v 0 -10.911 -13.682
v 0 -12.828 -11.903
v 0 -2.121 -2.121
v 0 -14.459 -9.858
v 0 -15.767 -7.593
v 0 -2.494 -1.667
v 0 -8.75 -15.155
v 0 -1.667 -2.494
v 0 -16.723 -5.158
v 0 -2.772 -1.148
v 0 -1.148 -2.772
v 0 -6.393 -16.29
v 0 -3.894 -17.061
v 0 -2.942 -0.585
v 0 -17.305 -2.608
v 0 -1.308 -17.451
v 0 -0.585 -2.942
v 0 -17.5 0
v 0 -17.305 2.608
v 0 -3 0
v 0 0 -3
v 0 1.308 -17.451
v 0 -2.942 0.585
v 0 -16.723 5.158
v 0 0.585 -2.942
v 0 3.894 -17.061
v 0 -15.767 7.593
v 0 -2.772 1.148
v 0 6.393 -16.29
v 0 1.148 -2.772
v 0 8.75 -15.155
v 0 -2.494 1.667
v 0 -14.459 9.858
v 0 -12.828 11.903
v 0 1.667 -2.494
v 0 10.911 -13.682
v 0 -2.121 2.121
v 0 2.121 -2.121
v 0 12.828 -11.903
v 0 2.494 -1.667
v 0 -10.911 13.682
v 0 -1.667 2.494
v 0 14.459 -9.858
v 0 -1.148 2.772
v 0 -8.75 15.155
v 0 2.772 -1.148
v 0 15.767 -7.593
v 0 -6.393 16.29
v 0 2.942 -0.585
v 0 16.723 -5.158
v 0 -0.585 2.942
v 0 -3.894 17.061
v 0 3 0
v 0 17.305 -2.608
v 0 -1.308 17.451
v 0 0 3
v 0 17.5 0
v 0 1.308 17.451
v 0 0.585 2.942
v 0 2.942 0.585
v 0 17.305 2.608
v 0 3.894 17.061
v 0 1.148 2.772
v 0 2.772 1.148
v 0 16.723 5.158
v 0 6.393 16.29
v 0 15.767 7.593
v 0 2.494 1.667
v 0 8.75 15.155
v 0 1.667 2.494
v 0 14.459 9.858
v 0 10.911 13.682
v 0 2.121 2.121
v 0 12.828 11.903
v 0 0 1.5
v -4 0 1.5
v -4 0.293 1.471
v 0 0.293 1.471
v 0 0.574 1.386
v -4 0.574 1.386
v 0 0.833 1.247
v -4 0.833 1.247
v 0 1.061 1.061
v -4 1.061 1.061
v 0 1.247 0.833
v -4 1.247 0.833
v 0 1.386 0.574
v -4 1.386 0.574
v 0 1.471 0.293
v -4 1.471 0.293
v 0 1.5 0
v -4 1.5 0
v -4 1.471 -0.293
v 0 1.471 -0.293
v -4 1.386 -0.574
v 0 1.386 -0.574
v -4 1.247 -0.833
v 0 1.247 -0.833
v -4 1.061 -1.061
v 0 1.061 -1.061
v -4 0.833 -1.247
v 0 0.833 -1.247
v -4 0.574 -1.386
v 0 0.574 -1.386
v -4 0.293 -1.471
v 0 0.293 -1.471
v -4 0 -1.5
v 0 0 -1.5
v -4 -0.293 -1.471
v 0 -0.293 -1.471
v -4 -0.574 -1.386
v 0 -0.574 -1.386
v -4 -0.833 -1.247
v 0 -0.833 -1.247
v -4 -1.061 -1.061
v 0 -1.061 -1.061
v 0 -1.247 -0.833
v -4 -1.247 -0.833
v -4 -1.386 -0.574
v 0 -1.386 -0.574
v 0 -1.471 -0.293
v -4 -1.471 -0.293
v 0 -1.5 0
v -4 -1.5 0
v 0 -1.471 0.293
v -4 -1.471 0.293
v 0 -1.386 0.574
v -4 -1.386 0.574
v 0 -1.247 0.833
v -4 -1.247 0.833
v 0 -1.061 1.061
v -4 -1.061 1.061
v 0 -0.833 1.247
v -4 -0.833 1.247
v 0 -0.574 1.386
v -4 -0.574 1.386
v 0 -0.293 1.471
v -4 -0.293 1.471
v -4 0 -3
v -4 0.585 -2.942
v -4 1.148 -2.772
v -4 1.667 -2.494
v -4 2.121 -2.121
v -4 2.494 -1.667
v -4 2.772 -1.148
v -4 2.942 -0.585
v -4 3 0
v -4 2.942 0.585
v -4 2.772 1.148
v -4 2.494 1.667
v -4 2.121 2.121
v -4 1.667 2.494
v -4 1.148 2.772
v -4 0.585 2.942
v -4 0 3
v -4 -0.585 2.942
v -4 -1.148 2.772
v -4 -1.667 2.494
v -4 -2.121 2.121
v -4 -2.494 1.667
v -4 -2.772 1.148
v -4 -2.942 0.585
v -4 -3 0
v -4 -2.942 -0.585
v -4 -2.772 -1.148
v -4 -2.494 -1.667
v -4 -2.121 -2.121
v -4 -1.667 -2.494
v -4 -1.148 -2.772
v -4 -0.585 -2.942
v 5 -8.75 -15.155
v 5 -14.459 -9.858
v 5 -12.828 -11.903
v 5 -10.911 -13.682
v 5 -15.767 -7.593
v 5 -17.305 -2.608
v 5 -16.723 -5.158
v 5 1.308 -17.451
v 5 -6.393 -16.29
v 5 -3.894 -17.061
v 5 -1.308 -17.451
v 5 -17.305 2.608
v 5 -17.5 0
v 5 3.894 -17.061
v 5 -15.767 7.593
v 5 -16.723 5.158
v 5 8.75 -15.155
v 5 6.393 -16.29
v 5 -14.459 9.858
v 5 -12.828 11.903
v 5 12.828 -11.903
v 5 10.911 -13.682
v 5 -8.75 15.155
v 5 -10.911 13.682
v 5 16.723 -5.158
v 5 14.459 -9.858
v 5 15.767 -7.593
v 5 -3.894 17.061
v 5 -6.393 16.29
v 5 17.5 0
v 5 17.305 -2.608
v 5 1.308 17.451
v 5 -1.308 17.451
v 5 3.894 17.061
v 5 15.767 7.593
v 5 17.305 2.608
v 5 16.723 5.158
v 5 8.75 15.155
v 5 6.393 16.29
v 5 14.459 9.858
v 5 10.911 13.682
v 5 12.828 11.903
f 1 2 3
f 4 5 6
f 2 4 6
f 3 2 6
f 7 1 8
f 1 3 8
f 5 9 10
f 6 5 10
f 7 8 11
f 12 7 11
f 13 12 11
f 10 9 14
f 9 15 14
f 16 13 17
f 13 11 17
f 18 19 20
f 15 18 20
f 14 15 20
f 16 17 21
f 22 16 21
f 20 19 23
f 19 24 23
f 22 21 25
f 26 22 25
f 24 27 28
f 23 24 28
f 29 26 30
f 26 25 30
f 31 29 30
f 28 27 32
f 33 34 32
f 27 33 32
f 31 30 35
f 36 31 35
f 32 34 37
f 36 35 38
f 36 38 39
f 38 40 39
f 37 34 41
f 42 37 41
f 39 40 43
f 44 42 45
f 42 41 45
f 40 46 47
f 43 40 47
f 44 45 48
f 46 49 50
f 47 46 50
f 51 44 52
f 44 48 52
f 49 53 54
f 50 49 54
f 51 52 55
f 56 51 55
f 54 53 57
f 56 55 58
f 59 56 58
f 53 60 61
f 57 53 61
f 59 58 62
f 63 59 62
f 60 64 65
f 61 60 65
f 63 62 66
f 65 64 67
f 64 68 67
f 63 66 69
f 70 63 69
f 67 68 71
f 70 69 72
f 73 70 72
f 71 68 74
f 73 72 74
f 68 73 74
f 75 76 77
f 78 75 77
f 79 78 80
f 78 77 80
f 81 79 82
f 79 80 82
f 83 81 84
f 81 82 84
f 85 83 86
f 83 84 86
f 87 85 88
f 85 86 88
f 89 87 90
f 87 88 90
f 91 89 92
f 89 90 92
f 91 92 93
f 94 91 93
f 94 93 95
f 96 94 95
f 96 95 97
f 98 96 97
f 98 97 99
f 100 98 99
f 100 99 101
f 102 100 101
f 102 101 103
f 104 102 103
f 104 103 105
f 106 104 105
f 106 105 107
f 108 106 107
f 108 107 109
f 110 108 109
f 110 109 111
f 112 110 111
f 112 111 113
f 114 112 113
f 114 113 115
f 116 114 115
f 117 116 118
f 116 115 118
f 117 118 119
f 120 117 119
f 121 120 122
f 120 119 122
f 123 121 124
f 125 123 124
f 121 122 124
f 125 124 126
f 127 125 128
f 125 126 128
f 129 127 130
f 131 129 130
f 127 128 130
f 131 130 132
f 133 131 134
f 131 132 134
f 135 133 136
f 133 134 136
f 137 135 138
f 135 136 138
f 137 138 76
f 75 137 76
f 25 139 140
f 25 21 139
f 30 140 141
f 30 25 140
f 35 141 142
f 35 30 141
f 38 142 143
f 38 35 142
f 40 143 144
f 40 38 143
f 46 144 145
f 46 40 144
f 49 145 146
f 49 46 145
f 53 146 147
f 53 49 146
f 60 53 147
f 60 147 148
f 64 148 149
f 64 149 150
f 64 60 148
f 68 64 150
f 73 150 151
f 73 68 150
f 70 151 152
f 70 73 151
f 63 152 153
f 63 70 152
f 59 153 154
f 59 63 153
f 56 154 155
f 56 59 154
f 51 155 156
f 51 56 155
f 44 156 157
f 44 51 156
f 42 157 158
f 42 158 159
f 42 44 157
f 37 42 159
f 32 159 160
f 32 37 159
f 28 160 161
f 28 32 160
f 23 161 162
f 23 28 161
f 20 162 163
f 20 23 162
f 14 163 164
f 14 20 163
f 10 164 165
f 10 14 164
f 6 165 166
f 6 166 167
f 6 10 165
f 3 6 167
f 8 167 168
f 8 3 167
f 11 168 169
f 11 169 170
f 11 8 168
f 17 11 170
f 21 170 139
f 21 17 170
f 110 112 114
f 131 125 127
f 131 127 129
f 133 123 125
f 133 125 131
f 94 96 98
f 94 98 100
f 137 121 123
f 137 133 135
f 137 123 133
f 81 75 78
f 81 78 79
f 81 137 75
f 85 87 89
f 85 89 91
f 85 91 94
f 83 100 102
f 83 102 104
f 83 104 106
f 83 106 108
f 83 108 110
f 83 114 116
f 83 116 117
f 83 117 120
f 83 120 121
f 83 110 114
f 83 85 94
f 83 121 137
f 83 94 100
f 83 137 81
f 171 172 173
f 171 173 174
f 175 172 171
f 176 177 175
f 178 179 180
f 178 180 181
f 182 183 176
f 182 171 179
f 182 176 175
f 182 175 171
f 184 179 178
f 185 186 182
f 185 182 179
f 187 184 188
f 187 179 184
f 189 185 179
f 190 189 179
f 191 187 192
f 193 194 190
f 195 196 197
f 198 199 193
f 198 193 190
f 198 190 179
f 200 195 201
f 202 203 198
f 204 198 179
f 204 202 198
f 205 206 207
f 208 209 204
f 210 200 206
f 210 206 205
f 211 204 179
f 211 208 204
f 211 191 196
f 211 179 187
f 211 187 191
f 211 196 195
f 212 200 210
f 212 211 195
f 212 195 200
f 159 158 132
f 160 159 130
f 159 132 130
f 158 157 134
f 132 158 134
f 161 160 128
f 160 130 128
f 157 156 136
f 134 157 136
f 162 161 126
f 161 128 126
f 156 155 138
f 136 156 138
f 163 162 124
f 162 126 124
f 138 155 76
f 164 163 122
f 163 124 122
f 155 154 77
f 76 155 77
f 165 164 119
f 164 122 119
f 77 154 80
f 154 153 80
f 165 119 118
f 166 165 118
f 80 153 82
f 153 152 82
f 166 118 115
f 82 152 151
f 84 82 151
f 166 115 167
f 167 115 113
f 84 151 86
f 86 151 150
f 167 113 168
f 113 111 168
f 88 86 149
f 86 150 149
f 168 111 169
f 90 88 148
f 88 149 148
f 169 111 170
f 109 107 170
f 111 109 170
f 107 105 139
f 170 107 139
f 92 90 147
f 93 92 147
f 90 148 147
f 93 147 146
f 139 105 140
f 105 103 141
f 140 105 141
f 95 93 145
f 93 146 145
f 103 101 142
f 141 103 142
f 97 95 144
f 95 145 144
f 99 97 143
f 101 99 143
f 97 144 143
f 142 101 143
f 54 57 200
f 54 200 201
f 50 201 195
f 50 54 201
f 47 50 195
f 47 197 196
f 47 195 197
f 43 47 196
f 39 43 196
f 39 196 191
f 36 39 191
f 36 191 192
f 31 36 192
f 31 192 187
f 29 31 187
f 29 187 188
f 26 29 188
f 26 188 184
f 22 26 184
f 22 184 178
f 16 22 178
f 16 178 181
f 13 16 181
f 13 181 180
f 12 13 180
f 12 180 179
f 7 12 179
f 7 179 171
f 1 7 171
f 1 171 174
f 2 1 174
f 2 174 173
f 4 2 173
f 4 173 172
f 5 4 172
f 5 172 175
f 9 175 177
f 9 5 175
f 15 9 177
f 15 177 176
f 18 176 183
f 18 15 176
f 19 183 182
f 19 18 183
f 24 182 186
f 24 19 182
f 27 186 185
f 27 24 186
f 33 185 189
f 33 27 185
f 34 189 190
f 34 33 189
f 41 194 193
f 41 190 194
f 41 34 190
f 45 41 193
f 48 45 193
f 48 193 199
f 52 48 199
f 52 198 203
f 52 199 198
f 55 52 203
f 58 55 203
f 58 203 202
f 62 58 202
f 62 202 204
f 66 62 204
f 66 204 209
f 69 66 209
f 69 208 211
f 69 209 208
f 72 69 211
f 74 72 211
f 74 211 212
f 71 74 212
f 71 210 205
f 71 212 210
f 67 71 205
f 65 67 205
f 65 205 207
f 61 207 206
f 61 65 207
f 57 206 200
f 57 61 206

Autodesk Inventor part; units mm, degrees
ref_plane "YZ Plane" through (0, 0, 0) normal (1, 0, 0) x (0, 1, 0)
ref_plane "XZ Plane" through (0, 0, 0) normal (0, 1, 0) x (-1, 0, 0)
ref_plane "XY Plane" through (0, 0, 0) normal (0, 0, 1) x (1, 0, 0)
sketch "Sketch1" plane through (0, 0, 0) normal (1, 0, 0) x (0, 1, 0)
  circle A0 centre (0, 0) radius 17.5
  dimension "d0" = 35
extrude "Extrusion1" add sketch "Sketch1" along normal blind 5
sketch "Sketch2" plane through (5, 0, 0) normal (1, 0, 0) x (0, 0, -1)
  circle A0 centre (0, 0) radius 3
  dimension "d3" = 6
extrude "Extrusion2" add sketch "Sketch2" against normal blind 9
sketch "Sketch3" plane through (-4, 0, 0) normal (-1, 0, 0) x (0, 0, 1)
  circle A0 centre (0, 0) radius 1.5
  dimension "d6" = 3
extrude "Extrusion3" cut sketch "Sketch3" against normal blind 4
properties part number "Front Wheel" material "PC/ABS Plastic"
